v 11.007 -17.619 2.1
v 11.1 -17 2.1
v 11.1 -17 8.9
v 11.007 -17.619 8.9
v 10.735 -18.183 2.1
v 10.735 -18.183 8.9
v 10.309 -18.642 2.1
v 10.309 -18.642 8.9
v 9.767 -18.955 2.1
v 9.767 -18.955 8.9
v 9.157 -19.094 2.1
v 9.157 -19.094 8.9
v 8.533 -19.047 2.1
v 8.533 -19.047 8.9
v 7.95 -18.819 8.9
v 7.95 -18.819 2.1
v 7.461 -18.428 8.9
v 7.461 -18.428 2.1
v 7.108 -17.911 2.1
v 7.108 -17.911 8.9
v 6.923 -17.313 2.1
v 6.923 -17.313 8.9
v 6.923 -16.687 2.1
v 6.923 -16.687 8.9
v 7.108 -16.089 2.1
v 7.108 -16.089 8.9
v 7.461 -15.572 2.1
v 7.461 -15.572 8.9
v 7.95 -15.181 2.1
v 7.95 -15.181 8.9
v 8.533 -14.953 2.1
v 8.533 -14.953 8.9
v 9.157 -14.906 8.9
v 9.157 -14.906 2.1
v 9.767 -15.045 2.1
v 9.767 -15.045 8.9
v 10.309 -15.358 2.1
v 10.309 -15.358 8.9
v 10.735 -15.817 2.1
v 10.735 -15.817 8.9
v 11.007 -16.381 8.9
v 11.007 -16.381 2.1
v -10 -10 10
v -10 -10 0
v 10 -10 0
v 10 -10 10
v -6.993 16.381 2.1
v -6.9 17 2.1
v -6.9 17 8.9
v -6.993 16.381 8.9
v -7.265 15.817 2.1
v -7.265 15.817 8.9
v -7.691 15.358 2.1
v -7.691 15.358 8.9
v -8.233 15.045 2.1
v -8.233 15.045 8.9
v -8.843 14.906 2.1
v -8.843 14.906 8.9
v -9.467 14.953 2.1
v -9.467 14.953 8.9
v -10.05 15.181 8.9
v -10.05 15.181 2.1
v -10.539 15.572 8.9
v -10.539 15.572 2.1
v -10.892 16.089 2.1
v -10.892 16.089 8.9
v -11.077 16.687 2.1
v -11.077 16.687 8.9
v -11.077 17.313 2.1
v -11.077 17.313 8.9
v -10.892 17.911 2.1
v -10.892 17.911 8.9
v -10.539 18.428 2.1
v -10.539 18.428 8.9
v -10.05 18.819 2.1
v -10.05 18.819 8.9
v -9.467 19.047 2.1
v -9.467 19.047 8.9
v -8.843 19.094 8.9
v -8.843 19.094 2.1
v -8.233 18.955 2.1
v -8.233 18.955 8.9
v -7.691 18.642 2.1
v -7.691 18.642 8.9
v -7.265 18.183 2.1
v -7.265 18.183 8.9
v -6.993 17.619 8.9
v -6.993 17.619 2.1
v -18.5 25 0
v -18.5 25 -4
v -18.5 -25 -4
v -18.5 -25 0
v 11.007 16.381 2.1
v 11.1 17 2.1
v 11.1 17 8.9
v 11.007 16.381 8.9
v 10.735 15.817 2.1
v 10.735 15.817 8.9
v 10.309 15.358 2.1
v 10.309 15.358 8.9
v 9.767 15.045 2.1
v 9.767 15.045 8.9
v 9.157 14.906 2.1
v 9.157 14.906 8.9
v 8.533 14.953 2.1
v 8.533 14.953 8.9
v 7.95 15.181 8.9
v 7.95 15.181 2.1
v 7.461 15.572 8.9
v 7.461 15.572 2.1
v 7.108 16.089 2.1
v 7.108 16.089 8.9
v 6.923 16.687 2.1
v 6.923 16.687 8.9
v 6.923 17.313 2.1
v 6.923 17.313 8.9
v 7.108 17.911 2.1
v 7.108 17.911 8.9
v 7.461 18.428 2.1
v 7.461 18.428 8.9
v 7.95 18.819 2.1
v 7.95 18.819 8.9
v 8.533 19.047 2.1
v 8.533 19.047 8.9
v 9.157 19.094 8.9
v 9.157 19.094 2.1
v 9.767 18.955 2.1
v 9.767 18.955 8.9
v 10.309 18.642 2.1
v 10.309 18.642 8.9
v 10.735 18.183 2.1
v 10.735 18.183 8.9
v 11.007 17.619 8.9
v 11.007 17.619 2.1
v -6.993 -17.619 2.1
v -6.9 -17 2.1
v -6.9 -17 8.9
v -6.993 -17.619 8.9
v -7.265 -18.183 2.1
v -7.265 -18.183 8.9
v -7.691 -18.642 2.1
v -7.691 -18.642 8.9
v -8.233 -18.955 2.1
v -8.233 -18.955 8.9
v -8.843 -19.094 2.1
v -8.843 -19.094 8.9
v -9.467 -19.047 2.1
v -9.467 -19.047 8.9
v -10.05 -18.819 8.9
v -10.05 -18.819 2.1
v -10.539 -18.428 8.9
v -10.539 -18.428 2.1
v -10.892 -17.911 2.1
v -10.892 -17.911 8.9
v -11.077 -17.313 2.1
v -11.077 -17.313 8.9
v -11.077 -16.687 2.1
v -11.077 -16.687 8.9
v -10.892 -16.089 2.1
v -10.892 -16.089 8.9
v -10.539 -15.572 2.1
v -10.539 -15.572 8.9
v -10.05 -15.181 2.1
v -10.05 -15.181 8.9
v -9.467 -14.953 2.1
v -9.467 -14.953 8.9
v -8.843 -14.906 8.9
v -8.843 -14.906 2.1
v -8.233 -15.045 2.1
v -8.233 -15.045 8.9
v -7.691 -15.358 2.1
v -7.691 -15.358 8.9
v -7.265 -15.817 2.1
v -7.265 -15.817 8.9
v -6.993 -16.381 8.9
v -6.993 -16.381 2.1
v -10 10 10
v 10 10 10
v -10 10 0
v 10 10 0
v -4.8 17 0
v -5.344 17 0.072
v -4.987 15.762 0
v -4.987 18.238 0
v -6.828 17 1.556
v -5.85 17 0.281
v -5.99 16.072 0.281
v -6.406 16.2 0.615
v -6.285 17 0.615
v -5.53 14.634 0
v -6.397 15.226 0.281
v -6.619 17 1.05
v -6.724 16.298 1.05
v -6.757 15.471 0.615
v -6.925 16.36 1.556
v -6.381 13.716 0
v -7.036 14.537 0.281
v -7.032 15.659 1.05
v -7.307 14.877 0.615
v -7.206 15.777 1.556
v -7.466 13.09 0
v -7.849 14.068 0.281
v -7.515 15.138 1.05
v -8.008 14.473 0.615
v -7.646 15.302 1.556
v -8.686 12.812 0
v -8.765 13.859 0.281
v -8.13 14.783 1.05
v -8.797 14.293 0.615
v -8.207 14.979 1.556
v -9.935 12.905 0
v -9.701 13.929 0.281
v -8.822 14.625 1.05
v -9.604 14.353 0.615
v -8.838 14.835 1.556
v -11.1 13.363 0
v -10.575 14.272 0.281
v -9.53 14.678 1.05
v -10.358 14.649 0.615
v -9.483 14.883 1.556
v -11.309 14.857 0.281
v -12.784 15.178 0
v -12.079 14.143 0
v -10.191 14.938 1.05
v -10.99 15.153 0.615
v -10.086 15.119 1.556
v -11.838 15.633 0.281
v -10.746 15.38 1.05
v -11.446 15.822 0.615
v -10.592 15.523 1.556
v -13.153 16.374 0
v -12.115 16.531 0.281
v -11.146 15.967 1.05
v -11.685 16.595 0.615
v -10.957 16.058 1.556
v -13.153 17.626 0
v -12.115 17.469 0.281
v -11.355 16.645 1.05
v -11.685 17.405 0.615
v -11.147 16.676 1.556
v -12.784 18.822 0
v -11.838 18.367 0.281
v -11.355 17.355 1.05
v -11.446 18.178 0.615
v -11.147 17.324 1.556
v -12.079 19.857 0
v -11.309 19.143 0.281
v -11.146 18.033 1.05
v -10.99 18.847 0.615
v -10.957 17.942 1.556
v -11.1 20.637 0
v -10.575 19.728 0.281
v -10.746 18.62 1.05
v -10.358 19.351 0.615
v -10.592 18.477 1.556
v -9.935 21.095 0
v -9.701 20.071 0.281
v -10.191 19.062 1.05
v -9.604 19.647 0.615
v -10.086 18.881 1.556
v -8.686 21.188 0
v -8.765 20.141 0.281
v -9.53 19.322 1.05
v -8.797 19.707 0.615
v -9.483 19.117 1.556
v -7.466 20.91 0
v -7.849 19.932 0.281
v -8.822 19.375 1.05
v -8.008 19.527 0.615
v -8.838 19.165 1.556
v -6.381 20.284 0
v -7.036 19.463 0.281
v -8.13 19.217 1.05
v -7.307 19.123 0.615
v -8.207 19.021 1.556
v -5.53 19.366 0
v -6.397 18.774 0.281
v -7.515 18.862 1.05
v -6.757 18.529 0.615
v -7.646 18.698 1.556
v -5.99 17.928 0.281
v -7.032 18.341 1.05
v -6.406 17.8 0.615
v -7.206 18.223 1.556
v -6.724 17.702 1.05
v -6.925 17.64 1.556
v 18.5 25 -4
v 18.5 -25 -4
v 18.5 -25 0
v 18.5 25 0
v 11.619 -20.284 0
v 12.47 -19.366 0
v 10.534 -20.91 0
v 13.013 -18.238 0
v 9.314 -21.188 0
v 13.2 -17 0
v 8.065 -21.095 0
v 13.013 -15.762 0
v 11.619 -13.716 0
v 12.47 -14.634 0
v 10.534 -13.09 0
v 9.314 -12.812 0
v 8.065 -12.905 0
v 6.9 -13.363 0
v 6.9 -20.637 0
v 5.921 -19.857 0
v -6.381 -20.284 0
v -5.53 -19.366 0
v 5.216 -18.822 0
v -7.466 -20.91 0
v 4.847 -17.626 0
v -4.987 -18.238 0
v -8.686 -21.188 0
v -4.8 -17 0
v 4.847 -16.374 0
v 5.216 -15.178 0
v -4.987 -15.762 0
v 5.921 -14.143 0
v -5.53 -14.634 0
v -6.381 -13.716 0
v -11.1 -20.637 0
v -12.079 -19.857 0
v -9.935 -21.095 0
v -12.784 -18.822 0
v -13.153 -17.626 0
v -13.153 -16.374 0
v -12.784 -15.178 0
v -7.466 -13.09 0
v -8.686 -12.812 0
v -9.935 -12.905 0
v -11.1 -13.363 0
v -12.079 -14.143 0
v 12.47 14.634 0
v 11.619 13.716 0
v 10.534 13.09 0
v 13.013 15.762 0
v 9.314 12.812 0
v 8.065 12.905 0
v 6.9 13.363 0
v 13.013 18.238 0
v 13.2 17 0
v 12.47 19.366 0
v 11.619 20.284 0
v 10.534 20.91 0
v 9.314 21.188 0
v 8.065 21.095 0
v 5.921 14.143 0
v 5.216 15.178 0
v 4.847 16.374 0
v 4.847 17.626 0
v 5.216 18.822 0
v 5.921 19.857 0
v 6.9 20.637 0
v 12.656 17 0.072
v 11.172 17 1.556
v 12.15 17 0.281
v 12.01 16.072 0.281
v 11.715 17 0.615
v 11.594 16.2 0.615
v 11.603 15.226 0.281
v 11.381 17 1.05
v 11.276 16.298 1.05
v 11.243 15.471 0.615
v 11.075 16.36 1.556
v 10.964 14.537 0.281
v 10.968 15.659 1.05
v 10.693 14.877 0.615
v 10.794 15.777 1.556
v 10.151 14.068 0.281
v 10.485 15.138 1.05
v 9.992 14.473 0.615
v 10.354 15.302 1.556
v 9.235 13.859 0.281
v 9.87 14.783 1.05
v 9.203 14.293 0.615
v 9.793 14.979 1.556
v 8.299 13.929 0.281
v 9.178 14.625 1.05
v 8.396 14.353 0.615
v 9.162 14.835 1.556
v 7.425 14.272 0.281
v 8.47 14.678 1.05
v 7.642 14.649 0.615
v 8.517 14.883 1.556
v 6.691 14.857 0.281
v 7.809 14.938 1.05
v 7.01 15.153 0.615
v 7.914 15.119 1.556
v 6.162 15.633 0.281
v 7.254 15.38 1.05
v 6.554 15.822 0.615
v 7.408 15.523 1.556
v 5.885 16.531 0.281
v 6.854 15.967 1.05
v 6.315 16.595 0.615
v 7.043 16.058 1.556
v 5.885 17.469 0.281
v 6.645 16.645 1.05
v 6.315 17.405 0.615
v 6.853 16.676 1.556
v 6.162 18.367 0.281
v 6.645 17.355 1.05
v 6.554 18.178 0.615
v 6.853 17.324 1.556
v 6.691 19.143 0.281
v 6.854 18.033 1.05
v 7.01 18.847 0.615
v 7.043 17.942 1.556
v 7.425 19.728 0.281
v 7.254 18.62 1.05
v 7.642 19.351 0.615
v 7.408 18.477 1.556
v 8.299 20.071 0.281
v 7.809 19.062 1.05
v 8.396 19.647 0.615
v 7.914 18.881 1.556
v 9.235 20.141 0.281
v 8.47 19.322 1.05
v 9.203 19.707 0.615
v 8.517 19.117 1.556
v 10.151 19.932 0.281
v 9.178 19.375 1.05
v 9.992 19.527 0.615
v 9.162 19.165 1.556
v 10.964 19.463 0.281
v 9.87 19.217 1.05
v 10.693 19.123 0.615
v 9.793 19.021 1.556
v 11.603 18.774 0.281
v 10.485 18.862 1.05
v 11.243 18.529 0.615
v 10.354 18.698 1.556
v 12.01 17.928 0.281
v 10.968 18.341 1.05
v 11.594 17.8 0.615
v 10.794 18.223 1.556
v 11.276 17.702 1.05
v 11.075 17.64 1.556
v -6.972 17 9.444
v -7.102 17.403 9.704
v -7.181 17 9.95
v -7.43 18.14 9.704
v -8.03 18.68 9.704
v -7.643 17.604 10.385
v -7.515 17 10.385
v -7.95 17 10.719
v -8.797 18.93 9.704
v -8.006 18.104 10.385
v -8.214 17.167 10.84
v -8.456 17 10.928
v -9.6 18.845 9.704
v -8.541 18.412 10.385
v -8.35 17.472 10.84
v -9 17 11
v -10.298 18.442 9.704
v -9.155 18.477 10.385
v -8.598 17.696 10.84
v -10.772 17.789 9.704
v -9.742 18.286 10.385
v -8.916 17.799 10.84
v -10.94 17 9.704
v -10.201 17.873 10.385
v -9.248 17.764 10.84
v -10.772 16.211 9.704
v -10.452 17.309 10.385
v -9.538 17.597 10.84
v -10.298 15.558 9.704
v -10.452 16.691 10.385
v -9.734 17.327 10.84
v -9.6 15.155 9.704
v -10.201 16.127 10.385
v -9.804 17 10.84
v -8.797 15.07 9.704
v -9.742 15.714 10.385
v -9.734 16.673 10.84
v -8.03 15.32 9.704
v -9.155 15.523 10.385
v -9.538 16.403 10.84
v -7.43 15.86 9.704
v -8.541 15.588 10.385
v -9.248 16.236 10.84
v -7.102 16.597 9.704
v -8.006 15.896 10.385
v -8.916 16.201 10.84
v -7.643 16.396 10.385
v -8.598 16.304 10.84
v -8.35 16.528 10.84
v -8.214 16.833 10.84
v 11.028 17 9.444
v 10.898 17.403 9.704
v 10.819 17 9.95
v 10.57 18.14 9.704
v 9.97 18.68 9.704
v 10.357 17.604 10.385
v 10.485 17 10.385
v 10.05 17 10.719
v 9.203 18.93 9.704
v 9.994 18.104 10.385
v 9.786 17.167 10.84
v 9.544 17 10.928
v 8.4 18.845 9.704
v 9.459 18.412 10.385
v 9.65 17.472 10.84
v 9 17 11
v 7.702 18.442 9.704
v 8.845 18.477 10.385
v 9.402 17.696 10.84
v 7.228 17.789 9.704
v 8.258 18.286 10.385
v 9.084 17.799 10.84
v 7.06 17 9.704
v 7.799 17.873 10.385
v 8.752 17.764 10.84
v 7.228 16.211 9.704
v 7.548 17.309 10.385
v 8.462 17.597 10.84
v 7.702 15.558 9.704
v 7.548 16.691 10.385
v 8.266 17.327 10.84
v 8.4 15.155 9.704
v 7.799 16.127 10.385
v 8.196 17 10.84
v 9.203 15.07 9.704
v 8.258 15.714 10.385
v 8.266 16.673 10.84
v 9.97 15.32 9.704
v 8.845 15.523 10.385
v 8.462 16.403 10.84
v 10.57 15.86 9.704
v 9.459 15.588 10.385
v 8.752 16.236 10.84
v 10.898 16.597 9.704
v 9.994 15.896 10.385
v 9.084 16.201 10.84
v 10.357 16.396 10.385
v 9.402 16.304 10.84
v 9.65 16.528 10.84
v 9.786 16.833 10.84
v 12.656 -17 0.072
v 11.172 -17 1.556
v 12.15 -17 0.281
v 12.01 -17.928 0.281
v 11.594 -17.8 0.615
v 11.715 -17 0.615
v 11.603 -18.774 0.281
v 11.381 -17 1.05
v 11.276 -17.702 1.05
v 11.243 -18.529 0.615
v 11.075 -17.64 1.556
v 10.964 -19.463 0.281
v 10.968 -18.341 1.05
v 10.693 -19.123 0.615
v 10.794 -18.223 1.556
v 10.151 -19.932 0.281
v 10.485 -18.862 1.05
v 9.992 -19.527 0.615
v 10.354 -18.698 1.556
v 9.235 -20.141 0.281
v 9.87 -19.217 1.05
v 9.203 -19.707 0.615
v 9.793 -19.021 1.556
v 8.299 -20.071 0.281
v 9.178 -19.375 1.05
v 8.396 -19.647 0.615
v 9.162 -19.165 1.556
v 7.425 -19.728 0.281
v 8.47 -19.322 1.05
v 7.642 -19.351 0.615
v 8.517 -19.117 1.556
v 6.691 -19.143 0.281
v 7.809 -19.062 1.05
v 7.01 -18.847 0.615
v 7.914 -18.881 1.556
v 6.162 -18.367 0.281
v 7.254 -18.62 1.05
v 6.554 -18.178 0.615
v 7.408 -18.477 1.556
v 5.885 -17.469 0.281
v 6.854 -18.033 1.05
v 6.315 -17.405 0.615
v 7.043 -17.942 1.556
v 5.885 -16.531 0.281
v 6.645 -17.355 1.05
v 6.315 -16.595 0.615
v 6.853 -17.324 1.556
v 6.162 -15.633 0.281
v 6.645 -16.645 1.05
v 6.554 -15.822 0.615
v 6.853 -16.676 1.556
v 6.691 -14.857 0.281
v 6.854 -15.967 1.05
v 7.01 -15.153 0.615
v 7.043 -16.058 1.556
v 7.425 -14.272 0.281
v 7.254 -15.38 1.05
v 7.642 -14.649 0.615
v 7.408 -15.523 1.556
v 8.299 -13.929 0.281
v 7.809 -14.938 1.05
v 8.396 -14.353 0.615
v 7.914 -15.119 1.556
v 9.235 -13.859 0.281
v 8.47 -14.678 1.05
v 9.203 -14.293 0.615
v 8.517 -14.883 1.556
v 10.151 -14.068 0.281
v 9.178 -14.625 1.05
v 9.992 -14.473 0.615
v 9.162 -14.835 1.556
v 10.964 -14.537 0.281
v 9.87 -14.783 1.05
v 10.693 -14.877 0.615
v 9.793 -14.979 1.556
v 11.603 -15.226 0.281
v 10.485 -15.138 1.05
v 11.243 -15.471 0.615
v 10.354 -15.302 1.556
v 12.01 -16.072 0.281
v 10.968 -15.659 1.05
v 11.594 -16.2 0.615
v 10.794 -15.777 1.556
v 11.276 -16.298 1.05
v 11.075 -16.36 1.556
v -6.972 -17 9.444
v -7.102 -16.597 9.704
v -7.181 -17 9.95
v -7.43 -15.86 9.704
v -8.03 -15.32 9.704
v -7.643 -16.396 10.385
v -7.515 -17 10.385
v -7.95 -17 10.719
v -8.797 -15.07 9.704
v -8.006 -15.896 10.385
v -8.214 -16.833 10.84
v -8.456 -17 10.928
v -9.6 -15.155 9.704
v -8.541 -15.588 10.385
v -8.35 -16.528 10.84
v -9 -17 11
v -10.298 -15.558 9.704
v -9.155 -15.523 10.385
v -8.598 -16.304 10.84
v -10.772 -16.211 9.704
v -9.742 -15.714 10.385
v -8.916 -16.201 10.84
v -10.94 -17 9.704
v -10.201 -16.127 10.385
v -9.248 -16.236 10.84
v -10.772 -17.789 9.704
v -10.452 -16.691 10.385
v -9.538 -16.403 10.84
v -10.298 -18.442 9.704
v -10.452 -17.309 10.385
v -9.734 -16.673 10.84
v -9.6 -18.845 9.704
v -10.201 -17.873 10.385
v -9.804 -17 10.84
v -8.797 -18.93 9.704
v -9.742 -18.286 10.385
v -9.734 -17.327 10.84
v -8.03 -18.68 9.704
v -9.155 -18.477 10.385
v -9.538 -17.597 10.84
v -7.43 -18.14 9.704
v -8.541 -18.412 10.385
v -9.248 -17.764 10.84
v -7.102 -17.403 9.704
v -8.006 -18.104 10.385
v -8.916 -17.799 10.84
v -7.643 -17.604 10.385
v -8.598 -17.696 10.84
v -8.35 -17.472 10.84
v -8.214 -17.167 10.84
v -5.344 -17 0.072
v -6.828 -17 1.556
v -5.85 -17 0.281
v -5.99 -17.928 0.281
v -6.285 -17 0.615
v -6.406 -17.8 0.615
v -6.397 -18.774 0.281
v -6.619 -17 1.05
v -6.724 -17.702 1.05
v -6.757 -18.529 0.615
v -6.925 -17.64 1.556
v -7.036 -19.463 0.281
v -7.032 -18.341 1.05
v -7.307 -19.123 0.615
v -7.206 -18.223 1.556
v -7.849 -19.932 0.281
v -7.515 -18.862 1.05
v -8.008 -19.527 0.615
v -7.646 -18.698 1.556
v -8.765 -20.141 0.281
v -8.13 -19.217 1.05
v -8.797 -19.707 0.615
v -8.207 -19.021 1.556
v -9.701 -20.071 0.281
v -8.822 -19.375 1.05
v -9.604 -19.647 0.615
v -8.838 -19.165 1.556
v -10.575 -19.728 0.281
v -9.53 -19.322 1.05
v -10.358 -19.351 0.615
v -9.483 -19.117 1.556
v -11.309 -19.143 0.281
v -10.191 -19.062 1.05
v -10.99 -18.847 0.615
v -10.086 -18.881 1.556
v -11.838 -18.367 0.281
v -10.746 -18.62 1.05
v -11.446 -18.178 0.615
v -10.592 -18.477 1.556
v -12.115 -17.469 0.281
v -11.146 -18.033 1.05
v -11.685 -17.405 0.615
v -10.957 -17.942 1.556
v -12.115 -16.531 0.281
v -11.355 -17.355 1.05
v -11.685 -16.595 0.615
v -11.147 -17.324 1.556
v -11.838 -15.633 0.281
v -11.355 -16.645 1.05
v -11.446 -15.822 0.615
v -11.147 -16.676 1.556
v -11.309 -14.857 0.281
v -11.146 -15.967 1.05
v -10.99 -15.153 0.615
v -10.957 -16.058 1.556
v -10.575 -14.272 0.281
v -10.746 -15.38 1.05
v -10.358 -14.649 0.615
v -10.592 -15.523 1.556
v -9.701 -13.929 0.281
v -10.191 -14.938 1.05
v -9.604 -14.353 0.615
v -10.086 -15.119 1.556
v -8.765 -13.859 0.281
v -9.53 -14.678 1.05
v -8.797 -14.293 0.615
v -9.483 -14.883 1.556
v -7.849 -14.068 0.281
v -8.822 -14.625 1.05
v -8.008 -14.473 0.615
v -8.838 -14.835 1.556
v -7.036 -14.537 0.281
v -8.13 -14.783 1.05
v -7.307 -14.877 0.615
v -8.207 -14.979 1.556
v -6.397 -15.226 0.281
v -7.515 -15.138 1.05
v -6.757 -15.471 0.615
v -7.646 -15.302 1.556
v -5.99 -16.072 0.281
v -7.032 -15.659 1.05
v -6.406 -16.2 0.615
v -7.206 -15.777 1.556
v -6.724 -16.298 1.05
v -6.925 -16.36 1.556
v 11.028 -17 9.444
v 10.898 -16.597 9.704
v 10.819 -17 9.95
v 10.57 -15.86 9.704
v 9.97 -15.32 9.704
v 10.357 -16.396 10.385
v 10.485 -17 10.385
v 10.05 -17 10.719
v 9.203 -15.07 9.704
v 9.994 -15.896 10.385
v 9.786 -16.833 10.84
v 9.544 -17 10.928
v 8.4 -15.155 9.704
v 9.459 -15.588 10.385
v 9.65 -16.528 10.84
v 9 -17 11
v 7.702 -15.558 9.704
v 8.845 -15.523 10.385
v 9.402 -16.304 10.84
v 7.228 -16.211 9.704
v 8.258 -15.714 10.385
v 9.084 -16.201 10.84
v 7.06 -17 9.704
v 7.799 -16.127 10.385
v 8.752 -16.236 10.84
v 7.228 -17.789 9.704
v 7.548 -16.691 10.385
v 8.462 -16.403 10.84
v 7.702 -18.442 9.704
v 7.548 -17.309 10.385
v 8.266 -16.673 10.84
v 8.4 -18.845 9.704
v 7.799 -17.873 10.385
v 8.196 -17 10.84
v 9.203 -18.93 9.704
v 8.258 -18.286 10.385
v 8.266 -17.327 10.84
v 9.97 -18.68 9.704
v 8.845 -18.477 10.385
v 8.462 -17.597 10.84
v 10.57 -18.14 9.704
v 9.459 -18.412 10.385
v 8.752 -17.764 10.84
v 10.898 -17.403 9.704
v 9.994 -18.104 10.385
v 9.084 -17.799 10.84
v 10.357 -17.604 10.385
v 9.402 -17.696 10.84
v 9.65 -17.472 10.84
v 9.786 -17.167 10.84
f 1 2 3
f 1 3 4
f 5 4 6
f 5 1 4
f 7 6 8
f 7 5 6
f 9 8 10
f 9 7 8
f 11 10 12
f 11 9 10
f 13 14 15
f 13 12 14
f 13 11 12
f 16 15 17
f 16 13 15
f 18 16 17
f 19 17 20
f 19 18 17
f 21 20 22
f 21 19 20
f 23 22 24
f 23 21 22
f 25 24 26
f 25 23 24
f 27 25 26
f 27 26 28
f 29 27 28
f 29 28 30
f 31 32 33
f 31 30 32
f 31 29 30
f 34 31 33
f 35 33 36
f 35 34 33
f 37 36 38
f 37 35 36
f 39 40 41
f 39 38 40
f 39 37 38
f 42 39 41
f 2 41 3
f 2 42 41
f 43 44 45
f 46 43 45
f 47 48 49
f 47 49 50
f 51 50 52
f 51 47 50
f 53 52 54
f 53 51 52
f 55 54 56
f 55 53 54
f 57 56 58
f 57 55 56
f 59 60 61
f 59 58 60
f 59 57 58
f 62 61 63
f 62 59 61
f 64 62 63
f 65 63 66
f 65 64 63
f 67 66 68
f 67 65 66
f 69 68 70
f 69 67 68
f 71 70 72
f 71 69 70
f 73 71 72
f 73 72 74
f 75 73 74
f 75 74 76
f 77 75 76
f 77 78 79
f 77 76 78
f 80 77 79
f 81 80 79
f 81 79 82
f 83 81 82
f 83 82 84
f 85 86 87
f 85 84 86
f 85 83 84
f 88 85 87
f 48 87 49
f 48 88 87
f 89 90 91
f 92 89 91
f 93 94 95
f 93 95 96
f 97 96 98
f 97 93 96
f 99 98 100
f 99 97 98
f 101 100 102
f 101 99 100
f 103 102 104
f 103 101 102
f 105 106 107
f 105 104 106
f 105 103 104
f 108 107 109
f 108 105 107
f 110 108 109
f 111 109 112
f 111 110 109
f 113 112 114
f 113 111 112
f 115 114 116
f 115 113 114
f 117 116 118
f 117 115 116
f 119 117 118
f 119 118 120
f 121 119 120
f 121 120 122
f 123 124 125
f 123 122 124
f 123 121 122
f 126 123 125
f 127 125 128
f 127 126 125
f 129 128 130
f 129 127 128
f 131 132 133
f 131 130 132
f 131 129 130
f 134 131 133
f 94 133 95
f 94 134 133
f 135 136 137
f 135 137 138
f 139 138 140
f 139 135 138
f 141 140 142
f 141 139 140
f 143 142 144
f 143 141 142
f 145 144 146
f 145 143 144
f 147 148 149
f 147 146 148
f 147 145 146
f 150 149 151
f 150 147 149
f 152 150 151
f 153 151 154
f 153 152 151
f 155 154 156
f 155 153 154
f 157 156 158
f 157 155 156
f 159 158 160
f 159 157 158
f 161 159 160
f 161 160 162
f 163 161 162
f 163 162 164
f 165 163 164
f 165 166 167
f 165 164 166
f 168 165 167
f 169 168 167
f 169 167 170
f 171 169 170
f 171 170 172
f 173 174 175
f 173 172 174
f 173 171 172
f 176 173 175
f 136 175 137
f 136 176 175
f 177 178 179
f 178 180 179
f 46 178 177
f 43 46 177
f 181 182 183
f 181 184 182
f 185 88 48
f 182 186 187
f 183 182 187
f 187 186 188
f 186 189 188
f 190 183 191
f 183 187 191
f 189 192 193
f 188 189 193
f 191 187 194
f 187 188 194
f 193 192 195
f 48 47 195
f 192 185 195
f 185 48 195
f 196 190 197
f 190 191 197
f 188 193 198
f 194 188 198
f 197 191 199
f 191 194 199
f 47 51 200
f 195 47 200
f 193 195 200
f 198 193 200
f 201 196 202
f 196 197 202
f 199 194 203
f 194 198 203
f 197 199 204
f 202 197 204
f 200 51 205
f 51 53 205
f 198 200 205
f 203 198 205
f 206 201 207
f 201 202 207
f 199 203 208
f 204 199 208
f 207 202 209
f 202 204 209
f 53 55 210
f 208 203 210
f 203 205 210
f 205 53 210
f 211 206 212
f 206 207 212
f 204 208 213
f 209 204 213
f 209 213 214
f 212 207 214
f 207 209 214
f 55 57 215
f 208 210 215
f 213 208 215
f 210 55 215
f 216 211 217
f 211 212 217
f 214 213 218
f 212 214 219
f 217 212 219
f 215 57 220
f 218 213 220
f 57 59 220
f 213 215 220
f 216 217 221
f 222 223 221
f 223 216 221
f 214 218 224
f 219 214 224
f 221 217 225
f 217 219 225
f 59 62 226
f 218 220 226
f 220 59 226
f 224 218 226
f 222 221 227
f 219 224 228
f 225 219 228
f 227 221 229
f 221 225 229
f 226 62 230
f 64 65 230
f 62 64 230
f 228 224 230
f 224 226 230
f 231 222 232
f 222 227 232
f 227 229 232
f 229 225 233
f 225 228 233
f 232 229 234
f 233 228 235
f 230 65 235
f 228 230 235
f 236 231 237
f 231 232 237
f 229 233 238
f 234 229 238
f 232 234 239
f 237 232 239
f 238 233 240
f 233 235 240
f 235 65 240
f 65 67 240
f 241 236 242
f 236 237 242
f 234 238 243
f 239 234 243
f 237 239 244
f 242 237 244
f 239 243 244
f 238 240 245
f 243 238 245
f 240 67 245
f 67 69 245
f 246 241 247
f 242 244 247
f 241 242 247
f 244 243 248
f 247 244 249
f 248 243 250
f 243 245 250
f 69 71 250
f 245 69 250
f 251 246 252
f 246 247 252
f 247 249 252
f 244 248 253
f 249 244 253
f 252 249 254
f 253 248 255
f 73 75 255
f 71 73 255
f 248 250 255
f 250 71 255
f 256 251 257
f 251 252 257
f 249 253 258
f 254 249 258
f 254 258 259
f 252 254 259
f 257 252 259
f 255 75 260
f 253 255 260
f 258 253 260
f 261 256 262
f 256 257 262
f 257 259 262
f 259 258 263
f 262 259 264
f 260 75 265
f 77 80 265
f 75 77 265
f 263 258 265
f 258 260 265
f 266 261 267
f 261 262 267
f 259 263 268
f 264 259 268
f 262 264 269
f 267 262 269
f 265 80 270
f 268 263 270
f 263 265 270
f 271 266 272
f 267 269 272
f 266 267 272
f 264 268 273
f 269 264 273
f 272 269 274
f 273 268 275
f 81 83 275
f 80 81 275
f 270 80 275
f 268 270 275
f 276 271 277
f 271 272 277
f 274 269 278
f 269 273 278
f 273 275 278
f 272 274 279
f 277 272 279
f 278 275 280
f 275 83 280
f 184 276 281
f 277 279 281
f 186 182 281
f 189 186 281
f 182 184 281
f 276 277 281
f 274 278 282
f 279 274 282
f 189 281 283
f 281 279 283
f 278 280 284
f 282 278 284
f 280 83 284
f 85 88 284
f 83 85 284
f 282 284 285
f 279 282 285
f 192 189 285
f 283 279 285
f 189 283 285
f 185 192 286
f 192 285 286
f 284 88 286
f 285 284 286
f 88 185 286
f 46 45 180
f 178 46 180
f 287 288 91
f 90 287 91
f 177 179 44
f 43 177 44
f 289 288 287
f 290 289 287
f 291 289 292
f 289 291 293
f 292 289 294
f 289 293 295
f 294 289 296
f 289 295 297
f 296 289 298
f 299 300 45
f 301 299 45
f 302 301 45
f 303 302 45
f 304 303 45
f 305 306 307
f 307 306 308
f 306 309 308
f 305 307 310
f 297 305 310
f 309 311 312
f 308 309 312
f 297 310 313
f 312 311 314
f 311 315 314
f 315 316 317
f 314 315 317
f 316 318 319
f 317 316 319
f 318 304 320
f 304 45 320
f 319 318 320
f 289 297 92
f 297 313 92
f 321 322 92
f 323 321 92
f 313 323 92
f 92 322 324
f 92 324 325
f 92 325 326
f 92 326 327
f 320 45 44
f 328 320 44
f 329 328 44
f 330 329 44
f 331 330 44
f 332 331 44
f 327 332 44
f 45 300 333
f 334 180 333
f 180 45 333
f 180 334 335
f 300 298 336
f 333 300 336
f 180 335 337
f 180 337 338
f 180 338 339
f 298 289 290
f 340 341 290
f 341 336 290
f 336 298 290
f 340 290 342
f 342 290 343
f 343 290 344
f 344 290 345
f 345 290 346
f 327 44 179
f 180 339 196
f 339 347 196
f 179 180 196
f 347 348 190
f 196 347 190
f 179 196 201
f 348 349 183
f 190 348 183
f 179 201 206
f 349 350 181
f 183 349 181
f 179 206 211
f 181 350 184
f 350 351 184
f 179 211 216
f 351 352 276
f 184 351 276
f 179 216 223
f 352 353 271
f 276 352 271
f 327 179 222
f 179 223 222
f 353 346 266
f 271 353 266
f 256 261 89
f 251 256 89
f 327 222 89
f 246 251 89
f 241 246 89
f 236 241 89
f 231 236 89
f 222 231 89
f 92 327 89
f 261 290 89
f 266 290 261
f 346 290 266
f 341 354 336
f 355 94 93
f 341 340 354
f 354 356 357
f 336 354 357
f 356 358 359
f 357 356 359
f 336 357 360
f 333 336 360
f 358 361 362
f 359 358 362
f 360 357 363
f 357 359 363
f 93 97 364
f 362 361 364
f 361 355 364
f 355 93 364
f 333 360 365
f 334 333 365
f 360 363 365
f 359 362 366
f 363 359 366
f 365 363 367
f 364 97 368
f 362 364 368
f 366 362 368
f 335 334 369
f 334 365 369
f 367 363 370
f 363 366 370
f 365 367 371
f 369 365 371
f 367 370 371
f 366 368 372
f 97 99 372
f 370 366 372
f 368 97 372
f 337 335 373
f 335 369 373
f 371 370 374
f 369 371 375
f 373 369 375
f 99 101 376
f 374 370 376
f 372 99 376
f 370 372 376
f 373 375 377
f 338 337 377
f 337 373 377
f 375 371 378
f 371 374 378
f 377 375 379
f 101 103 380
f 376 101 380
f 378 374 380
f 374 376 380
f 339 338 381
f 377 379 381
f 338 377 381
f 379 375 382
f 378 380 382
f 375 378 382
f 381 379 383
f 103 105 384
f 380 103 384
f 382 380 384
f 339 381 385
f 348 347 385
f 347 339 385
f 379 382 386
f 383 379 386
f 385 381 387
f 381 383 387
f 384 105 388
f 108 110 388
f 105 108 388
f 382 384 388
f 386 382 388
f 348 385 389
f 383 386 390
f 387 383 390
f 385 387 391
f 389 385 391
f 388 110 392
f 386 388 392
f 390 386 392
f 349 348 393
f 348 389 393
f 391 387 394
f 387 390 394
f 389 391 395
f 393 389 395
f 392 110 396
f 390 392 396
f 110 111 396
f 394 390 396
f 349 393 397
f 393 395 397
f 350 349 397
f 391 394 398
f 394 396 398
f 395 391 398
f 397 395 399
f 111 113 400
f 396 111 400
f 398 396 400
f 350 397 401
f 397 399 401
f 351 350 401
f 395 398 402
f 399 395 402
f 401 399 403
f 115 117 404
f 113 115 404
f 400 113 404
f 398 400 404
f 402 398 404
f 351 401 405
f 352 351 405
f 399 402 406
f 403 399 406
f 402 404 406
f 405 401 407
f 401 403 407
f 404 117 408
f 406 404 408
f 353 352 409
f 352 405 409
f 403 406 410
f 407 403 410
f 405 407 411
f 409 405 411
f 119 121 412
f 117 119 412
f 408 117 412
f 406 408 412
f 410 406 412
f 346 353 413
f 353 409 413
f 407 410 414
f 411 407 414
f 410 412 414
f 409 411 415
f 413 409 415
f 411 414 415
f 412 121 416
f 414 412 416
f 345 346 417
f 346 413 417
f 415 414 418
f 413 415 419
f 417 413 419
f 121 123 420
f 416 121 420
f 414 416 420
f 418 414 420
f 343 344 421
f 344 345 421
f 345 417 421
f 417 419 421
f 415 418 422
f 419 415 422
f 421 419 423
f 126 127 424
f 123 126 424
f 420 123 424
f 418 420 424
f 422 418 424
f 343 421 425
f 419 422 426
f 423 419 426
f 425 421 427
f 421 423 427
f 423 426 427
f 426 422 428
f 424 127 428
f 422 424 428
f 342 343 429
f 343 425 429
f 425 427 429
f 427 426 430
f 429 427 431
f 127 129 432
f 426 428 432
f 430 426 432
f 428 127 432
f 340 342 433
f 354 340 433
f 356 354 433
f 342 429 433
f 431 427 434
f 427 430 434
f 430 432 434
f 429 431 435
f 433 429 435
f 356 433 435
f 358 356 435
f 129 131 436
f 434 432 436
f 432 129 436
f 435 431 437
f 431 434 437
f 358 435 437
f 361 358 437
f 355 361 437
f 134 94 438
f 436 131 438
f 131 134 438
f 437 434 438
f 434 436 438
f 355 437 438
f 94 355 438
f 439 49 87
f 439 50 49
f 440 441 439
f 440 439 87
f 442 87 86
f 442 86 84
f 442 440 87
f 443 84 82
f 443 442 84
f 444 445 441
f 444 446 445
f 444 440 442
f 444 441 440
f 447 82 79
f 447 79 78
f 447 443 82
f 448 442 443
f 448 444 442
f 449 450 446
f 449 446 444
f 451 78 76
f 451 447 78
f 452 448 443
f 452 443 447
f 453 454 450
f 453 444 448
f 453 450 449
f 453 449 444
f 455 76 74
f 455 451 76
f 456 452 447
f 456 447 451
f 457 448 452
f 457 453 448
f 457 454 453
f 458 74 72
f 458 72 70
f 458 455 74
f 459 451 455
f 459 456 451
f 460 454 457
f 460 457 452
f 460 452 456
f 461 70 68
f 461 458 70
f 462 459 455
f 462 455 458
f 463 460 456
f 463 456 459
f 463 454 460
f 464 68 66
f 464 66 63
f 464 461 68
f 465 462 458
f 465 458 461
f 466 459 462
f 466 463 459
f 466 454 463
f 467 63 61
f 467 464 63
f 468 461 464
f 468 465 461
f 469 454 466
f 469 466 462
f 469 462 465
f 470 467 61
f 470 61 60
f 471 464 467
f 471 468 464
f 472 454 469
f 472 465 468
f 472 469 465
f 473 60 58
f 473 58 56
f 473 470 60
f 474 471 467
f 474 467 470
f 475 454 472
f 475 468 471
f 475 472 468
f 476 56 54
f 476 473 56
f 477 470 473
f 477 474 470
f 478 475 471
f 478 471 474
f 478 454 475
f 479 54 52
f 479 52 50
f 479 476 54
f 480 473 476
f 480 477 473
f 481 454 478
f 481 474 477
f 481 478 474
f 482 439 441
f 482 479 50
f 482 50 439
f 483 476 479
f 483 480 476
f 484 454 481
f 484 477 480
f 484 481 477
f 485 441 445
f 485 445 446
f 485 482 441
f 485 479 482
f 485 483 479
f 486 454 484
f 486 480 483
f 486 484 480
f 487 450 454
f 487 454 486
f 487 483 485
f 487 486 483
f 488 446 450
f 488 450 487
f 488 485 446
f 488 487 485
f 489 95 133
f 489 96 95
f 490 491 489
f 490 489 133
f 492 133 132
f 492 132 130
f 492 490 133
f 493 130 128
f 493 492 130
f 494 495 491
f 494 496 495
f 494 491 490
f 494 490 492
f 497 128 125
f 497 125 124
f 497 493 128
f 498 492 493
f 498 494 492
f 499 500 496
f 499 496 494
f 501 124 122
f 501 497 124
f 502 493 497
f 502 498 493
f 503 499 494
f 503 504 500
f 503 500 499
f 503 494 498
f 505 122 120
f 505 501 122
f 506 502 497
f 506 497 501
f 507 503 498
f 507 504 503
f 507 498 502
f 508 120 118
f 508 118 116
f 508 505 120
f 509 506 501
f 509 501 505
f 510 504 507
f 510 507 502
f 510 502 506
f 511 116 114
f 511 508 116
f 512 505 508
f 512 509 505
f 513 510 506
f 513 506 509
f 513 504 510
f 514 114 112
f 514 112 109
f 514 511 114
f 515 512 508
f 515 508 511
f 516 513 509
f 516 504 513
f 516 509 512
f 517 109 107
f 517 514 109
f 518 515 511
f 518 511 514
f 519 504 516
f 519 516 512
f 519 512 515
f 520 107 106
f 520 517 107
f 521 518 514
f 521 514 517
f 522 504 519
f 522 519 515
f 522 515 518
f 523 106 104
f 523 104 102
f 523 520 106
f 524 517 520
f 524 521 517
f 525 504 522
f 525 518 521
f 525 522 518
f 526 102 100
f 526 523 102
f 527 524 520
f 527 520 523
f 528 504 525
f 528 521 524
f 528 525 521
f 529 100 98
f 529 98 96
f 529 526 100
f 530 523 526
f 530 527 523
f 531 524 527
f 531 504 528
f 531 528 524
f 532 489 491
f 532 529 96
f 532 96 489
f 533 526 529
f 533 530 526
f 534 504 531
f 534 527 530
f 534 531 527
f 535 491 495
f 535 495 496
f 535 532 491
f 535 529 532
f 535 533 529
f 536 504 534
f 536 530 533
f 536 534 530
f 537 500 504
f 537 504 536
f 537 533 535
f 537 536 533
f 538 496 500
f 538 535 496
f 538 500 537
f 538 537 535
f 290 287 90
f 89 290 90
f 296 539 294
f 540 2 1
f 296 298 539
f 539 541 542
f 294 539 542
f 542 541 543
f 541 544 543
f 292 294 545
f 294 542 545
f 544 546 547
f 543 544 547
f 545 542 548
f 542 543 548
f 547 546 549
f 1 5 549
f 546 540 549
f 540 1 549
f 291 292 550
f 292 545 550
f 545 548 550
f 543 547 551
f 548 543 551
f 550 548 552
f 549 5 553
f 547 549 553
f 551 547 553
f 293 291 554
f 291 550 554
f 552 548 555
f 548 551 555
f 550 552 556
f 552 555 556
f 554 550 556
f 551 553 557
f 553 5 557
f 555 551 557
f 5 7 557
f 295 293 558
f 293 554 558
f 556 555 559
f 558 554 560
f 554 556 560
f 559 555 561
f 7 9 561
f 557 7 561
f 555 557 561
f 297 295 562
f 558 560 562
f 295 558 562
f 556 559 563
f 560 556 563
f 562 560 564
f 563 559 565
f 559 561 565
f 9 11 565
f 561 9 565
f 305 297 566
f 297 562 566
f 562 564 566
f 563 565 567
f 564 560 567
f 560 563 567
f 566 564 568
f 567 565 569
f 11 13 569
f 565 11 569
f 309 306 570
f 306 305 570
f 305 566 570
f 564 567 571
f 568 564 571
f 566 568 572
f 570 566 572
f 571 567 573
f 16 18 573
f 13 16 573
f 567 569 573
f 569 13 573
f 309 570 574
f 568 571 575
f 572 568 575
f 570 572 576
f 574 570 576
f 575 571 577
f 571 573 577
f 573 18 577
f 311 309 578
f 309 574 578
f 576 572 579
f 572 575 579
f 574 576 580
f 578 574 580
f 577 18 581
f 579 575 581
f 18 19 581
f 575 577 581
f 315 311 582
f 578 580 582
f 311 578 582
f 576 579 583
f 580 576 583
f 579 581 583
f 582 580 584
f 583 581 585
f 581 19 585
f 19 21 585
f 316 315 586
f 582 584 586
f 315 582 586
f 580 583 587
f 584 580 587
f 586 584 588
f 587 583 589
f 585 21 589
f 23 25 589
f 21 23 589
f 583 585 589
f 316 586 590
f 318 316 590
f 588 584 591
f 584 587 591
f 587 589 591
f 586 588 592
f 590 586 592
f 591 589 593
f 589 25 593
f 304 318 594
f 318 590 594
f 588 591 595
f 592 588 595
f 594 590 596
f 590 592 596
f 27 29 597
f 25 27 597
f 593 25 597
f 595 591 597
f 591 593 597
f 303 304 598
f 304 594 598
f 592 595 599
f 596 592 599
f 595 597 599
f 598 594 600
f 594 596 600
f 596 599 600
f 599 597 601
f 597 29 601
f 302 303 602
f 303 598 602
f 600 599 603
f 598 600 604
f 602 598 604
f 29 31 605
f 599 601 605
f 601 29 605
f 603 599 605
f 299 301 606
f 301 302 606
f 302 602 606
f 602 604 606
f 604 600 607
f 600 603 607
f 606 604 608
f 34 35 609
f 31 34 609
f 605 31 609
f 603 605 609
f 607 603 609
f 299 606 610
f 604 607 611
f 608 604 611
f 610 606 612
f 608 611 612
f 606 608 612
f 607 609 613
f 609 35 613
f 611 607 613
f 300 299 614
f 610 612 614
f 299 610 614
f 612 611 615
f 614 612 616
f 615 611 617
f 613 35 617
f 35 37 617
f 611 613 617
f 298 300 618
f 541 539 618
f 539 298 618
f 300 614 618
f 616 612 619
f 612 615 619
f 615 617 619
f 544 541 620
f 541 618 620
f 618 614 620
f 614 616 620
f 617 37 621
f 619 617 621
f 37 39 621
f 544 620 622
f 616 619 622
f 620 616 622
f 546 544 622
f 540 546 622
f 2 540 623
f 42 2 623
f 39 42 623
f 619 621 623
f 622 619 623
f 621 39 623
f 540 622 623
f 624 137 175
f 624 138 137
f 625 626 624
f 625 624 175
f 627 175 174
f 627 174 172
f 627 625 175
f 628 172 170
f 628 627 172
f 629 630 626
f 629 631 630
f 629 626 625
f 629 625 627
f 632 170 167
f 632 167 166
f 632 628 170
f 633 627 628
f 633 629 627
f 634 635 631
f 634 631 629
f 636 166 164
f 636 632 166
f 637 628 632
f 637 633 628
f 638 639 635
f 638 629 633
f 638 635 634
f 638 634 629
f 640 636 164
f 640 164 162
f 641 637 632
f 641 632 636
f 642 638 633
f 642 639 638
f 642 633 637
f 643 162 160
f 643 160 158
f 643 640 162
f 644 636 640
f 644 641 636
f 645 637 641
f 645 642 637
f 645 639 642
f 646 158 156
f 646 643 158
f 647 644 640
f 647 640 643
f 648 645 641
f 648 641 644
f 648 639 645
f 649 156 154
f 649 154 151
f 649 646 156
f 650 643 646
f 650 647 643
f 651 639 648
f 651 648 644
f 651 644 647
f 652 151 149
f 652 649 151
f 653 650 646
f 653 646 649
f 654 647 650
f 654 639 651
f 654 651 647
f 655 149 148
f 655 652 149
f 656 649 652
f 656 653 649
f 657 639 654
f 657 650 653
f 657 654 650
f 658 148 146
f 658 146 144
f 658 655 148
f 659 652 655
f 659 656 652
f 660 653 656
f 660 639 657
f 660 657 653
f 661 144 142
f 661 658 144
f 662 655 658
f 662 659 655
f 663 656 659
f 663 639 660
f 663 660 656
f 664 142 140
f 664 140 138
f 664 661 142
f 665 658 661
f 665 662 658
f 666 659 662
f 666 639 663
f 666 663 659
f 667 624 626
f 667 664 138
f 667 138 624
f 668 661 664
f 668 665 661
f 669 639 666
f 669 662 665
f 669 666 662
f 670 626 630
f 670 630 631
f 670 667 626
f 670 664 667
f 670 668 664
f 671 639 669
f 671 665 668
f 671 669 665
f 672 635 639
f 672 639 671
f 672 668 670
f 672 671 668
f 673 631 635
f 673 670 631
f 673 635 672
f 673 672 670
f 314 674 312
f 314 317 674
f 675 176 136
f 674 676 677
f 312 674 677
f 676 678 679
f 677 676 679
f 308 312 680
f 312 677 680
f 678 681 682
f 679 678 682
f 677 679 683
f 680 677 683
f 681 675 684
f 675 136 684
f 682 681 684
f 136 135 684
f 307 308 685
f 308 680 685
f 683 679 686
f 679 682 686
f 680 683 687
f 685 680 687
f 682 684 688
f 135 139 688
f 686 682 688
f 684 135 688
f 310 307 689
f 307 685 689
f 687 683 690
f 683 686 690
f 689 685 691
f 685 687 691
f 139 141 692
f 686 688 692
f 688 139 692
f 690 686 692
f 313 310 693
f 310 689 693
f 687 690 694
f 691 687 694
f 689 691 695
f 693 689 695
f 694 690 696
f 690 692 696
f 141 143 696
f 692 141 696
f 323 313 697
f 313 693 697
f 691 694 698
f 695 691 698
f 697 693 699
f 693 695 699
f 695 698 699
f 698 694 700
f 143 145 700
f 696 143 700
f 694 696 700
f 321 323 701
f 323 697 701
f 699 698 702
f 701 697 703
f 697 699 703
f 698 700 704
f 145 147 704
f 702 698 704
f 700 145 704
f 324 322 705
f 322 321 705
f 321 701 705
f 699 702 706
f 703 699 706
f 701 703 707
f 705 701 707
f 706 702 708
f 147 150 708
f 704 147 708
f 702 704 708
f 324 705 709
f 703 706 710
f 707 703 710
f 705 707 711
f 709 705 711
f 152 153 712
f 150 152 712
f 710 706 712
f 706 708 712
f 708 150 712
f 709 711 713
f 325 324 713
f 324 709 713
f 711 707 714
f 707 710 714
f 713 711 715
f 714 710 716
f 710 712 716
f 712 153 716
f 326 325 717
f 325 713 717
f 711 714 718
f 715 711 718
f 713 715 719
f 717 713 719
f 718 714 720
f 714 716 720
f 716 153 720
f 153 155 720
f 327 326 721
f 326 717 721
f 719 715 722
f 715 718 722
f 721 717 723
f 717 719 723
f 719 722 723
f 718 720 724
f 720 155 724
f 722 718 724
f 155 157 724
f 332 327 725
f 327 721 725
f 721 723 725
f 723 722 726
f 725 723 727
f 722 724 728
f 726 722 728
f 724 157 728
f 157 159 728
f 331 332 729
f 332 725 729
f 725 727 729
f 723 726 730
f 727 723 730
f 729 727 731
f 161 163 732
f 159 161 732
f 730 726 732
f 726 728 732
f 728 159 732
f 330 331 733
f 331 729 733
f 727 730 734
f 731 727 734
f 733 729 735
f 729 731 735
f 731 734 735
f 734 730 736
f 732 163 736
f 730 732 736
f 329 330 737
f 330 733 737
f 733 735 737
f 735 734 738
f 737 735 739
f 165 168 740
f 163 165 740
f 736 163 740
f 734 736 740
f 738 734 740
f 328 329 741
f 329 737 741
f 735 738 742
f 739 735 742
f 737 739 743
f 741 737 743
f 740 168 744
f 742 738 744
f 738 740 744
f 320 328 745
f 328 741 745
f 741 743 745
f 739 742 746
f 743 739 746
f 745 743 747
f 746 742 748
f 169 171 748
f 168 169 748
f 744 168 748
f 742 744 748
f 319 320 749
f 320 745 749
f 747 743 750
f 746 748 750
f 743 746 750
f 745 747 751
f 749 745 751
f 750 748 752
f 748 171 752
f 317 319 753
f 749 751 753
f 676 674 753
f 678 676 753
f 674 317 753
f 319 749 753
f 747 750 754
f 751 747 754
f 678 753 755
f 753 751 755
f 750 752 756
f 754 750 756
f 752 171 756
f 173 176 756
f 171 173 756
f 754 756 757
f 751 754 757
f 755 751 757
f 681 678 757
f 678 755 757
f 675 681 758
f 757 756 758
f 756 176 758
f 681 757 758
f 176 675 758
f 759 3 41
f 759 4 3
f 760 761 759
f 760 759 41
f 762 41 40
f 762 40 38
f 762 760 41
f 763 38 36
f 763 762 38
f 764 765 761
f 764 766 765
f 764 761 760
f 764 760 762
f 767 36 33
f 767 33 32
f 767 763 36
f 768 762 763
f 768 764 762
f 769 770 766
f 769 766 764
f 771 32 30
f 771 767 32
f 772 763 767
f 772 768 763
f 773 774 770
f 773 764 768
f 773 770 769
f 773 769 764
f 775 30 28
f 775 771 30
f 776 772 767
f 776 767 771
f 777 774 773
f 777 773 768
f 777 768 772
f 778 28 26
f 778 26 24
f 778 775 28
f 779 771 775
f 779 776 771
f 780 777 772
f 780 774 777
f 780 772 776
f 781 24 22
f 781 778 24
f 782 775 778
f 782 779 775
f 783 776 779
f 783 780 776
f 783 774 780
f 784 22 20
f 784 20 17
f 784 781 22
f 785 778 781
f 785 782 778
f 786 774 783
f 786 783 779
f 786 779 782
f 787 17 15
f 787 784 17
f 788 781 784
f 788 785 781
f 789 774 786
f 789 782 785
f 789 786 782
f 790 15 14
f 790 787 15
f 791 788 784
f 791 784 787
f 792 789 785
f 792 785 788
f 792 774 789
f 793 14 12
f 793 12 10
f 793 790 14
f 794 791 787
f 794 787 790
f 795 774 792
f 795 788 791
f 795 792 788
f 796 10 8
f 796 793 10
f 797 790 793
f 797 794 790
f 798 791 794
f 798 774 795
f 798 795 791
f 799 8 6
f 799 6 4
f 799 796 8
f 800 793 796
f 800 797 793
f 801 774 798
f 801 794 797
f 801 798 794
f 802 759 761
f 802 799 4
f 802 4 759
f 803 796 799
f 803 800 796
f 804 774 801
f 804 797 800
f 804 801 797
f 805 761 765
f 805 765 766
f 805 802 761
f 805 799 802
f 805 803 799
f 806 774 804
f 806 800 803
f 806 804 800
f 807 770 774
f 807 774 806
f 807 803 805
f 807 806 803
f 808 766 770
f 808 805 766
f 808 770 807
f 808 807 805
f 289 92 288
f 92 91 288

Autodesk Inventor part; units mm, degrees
ref_plane "YZ Plane" through (0, 0, 0) normal (1, 0, 0) x (0, 1, 0)
ref_plane "XZ Plane" through (0, 0, 0) normal (0, 1, 0) x (-1, 0, 0)
ref_plane "XY Plane" through (0, 0, 0) normal (0, 0, 1) x (1, 0, 0)
sketch "Sketch1" plane through (0, 0, 0) normal (0, 0, 1) x (1, 0, 0)
  line L0 (-13.5, 20) -> (13.5, 20)
  line L1 (13.5, 20) -> (13.5, -20)
  line L2 (13.5, -20) -> (-13.5, -20)
  line L3 (-13.5, -20) -> (-13.5, 20)
  line L4 (-10, 10) -> (10, 10)
  line L5 (10, 10) -> (10, -10)
  line L6 (10, -10) -> (-10, -10)
  line L7 (-10, -10) -> (-10, 10)
  circle A0 centre (-8, 15) radius 2.025
  circle A1 centre (8, 15) radius 2.025
  circle A2 centre (8, -15) radius 2.025
  circle A3 centre (-8, -15) radius 2.025
  line L8 (-16.5, 23) -> (16.5, 23)
  line L9 (16.5, 23) -> (16.5, -23)
  line L10 (16.5, -23) -> (-16.5, -23)
  line L11 (-16.5, -23) -> (-16.5, 23)
  point P0 (0, 0)
  dimension "d0" = 27
  dimension "d1" = 40
  dimension "d2" = 20
  dimension "d3" = 13.5
  dimension "d4" = 20
  dimension "d5" = 20
  dimension "d6" = 3.5
  dimension "d7" = 10
  dimension "d8" = 4.05
  dimension "d9" = 5
  dimension "d10" = 5.5
  dimension "d11" = 4.05
  dimension "d12" = 5.5
  dimension "d13" = 4.05
  dimension "d14" = 5
  dimension "d15" = 4.05
  dimension "d16" = 5
  dimension "d17" = 33
  dimension "d18" = 46
  dimension "d19" = 16.5
  dimension "d20" = 23
  dimension "d29" = 5.5
  dimension "d30" = 5.5
  dimension "d31" = 5
extrude "Extrusion1" add sketch "Sketch1" along normal blind 12 contours L4 L5 L6 L7 | A0 | A1 | A2 | A3
extrude "Extrusion2" add sketch "Sketch1" against normal blind 4 contours L0 L1 L2 L3 | L4 L5 L6 L7 | A0 | A1 | A2 | A3 | L8 L9 L10 L11
extrude "Extrusion3" add sketch "Sketch1" along normal blind 11 contours L8 L9 L10 L11
sketch "Sketch2" plane through (0, 0, 12) normal (0, 0, 1) x (1, 0, 0)
  line L0 (-10, -10) -> (10, -10) projected
  line L1 (10, -10) -> (10, 10) projected
  line L2 (10, 10) -> (-10, 10) projected
  line L3 (-10, 10) -> (-10, -10) projected
  circle A0 centre (-8, 15) radius 2.025 projected
  circle A1 centre (8, 15) radius 2.025 projected
  circle A2 centre (8, -15) radius 2.025 projected
  circle A3 centre (-8, -15) radius 2.025 projected
  point P0 (0, 0)
extrude "Extrusion4" cut sketch "Sketch2" against normal up to surface (16 mm away)
sketch "Sketch6" plane through (0, 0, -4) normal (0, 0, -1) x (-1, 0, 0)
  line L0 (-10, -10) -> (-10, 10) projected
  line L1 (10, -10) -> (-10, -10) projected
  line L2 (-10, 10) -> (10, 10)
  line L3 (10, 10) -> (10, -10)
  line L4 (10, -10) -> (-10, -10)
  line L5 (-10, -10) -> (-10, 10)
  point P0 (0, 0)
extrude "Extrusion7" add sketch "Sketch6" against normal blind 14
sketch "Sketch9" plane through (0, 0, 11) normal (0, 0, 1) x (1, 0, 0)
  line L0 (-16.5, -23) -> (16.5, -23) projected
  line L1 (16.5, -23) -> (16.5, 23) projected
  line L2 (16.5, 23) -> (-16.5, 23) projected
  line L3 (-16.5, 23) -> (-16.5, -23) projected
  line L4 (-13.5, 20) -> (13.5, 20) projected
  line L5 (13.5, 20) -> (13.5, -20) projected
  line L6 (13.5, -20) -> (-13.5, -20) projected
  line L7 (-13.5, -20) -> (-13.5, 20) projected
  point P0 (0, 0)
extrude "Extrusion9" cut sketch "Sketch9" against normal blind 11
sketch "Sketch10" plane through (0, 0, -4) normal (0, 0, -1) x (-1, 0, 0)
  circle A0 centre (-8, -15) radius 2.025 projected
  circle A1 centre (8, -15) radius 2.025 projected
  circle A2 centre (-8, 15) radius 2.025 projected
  circle A3 centre (8, 15) radius 2.025 projected
  point P0 (0, 0)
extrude "Extrusion10" add sketch "Sketch10" against normal blind 4
sketch "Sketch11" plane through (0, 0, 0) normal (0, 0, 1) x (1, 0, 0)
  circle A0 centre (-9, 17) radius 2.1
  circle A1 centre (9, 17) radius 2.1
  line L0 (-16.5, -23) -> (-16.5, 23) projected
  line L1 (16.5, 23) -> (16.5, -23) projected
  line L2 (-16.5, 23) -> (16.5, 23) projected
  circle A2 centre (-9, -17) radius 2.1
  circle A3 centre (9, -17) radius 2.1
  line L3 (-16.5, -23) -> (16.5, -23)
  point P0 (0, 0)
  dimension "d70" = 4.2
  dimension "d71" = 4.2
  dimension "d72" = 7.5
  dimension "d73" = 7.5
  dimension "d74" = 6
  dimension "d75" = 6
extrude "Extrusion11" add sketch "Sketch11" along normal blind 11 contours A0 | A1 | A2 | A3
fillet "Fillet3" radius 2.1 4 edges at (-11.1, -17, 11) (6.9, -17, 11) (6.9, 17, 11) (-11.1, 17, 11)
sketch "Sketch12" plane through (0, 0, -4) normal (0, 0, -1) x (-1, 0, 0)
  line L0 (18.5, -25) -> (-18.5, -25)
  line L1 (-18.5, -25) -> (-18.5, 25)
  line L2 (-18.5, 25) -> (18.5, 25)
  line L3 (18.5, 25) -> (18.5, -25)
  line L4 (16.5, -23) -> (16.5, 23) projected
  line L5 (-16.5, -23) -> (16.5, -23) projected
  line L6 (-16.5, -23) -> (16.5, -23) projected
  line L7 (16.5, -23) -> (16.5, 23) projected
  line L8 (16.5, 23) -> (-16.5, 23) projected
  line L9 (-16.5, 23) -> (-16.5, -23) projected
  point P0 (0, 0)
  dimension "d79" = 37
  dimension "d80" = 50
  dimension "d81" = 2
  dimension "d82" = 2
extrude "Extrusion12" add sketch "Sketch12" against normal blind 4
fillet "Fillet4" radius 2.1 4 edges at (6.9, 17, 0) (-11.1, 17, 0) (6.9, -17, 0) (-11.1, -17, 0)
properties part number "PDMS Chamber-Mold-V8 Steven"
